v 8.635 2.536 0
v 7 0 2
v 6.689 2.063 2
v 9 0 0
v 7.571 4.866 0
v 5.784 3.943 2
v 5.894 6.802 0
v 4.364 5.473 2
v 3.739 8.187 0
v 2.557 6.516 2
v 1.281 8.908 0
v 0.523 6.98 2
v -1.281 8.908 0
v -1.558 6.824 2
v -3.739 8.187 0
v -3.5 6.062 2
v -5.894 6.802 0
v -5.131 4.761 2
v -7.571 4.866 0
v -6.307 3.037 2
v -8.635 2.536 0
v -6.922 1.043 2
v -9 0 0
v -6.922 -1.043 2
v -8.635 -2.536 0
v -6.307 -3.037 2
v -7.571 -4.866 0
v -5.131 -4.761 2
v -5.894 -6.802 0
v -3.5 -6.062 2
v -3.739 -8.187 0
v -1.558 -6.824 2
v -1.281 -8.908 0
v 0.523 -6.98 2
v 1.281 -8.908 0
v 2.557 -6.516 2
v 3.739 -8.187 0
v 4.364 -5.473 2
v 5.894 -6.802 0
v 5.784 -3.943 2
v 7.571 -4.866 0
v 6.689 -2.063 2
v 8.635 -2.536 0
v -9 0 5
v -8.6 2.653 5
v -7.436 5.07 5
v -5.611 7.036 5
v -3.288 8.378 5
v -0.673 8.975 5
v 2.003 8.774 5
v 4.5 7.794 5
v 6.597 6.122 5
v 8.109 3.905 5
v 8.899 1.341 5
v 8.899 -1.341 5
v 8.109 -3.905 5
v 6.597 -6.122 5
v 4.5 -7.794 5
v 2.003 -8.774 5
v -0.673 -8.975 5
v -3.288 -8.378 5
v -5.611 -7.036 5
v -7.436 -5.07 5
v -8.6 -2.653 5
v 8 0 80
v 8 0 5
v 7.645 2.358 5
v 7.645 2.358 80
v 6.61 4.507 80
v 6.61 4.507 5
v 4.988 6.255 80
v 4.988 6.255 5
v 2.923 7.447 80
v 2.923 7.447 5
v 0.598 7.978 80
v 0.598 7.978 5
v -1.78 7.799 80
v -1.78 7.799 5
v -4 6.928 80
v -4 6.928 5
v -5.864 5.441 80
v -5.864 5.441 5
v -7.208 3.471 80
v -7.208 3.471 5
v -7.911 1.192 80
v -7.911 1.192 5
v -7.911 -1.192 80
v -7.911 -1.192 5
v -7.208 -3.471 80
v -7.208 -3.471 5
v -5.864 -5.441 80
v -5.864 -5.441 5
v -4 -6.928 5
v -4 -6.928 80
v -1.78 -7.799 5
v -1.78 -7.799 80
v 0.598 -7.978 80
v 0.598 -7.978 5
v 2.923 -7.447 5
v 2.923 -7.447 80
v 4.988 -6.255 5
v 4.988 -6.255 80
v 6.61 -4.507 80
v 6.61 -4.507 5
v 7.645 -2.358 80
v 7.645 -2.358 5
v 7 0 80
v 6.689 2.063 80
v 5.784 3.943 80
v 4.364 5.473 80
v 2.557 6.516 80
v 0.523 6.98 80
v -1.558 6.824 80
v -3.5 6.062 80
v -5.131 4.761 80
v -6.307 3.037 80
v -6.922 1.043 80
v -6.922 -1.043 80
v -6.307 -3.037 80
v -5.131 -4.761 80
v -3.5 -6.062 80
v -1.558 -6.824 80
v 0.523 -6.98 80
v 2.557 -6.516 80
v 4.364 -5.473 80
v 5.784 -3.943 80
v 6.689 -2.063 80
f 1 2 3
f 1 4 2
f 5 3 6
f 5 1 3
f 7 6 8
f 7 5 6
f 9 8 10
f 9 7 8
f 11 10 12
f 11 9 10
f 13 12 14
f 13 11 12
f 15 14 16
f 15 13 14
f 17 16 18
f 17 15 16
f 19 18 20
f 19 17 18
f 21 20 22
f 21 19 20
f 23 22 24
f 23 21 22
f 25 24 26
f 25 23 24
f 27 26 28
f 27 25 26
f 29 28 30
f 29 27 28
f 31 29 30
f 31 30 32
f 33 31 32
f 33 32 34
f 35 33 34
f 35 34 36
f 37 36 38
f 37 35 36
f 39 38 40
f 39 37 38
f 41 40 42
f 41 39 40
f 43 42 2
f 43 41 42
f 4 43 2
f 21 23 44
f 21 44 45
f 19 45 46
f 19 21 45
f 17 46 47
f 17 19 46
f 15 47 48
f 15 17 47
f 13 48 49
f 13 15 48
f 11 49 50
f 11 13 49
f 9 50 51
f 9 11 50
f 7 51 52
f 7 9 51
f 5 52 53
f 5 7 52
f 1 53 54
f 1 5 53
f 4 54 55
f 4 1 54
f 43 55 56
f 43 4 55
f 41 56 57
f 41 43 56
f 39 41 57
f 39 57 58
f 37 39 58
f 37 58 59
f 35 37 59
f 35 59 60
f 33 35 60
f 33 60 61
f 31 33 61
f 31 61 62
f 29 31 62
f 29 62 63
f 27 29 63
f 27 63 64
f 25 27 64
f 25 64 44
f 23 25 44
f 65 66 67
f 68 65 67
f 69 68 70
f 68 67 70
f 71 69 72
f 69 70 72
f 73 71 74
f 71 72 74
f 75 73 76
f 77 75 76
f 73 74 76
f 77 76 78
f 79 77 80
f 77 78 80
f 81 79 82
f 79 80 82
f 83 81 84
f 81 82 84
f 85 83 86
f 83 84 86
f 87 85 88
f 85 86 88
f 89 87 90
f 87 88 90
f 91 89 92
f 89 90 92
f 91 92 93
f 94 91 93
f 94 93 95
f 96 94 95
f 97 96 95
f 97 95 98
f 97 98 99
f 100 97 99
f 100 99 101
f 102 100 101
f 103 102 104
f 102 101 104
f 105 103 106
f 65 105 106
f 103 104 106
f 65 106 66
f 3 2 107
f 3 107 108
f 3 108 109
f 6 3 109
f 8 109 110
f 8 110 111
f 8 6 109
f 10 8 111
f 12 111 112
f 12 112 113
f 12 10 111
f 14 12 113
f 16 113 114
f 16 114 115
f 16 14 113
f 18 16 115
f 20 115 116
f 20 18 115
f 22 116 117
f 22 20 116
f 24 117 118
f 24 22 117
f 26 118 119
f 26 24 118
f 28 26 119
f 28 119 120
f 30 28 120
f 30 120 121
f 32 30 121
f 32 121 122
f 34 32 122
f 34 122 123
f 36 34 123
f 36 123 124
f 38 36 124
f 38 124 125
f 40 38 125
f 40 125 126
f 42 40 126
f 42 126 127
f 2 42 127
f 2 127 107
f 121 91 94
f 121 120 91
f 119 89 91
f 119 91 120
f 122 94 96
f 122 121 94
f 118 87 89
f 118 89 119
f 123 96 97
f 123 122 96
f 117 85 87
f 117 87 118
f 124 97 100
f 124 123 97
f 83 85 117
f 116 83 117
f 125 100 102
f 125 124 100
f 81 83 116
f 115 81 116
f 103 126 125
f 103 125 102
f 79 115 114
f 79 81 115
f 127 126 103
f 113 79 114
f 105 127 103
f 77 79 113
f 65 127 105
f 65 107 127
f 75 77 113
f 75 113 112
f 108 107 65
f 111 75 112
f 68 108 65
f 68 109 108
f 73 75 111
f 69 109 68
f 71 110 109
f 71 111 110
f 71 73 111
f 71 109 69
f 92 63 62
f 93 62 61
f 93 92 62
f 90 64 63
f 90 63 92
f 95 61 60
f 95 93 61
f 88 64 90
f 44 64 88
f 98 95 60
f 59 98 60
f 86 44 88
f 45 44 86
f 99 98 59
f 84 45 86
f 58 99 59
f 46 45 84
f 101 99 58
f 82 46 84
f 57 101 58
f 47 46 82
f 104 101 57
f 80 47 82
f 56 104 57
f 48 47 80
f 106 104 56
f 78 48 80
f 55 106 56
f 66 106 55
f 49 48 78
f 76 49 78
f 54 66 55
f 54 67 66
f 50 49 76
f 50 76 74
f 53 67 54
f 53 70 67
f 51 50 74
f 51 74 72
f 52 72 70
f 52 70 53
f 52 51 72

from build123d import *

# Parameters (mm, degrees)
SCHIZZO1_R                   = 9.75
SCHIZZO1_R_2                 = 7
ESTRUSIONE_ESTRUSIONE1_DEPTH = 5
SCHIZZO3_R                   = 8
SCHIZZO3_R_2                 = 7
ESTRUSIONE_ESTRUSIONE2_DEPTH = 75
SMUSSO1_SIZE                 = 2
SCHIZZO4_R                   = 9.75
SCHIZZO4_R_2                 = 9
TAGLIO_ESTRUSIONE1_DEPTH     = 10


with BuildPart() as part:
    # Schizzo1 → Estrusione-Estrusione1 (new body)
    with BuildSketch(Plane.XY):
        Circle(SCHIZZO1_R)
        Circle(SCHIZZO1_R_2, mode=Mode.SUBTRACT)
    extrude(amount=ESTRUSIONE_ESTRUSIONE1_DEPTH)

    # Schizzo3 → Estrusione-Estrusione2 (add)
    with BuildSketch(Plane.XY.offset(5)):
        Circle(SCHIZZO3_R)
        Circle(SCHIZZO3_R_2, mode=Mode.SUBTRACT)
    extrude(amount=ESTRUSIONE_ESTRUSIONE2_DEPTH)

    # Smusso1
    smusso1_edges = [part.edges().sort_by_distance(p)[0] for p in [
        (-7, 0, 0),
    ]]
    chamfer(smusso1_edges, length=SMUSSO1_SIZE)

    # Schizzo4 → Taglio-Estrusione1 (cut)
    with BuildSketch(Plane(origin=(0, 0, 0), x_dir=(-1, 0, 0), z_dir=(0, 0, -1))):
        Circle(SCHIZZO4_R)
        Circle(SCHIZZO4_R_2, mode=Mode.SUBTRACT)
    extrude(amount=-TAGLIO_ESTRUSIONE1_DEPTH, mode=Mode.SUBTRACT)


solid = part.part
